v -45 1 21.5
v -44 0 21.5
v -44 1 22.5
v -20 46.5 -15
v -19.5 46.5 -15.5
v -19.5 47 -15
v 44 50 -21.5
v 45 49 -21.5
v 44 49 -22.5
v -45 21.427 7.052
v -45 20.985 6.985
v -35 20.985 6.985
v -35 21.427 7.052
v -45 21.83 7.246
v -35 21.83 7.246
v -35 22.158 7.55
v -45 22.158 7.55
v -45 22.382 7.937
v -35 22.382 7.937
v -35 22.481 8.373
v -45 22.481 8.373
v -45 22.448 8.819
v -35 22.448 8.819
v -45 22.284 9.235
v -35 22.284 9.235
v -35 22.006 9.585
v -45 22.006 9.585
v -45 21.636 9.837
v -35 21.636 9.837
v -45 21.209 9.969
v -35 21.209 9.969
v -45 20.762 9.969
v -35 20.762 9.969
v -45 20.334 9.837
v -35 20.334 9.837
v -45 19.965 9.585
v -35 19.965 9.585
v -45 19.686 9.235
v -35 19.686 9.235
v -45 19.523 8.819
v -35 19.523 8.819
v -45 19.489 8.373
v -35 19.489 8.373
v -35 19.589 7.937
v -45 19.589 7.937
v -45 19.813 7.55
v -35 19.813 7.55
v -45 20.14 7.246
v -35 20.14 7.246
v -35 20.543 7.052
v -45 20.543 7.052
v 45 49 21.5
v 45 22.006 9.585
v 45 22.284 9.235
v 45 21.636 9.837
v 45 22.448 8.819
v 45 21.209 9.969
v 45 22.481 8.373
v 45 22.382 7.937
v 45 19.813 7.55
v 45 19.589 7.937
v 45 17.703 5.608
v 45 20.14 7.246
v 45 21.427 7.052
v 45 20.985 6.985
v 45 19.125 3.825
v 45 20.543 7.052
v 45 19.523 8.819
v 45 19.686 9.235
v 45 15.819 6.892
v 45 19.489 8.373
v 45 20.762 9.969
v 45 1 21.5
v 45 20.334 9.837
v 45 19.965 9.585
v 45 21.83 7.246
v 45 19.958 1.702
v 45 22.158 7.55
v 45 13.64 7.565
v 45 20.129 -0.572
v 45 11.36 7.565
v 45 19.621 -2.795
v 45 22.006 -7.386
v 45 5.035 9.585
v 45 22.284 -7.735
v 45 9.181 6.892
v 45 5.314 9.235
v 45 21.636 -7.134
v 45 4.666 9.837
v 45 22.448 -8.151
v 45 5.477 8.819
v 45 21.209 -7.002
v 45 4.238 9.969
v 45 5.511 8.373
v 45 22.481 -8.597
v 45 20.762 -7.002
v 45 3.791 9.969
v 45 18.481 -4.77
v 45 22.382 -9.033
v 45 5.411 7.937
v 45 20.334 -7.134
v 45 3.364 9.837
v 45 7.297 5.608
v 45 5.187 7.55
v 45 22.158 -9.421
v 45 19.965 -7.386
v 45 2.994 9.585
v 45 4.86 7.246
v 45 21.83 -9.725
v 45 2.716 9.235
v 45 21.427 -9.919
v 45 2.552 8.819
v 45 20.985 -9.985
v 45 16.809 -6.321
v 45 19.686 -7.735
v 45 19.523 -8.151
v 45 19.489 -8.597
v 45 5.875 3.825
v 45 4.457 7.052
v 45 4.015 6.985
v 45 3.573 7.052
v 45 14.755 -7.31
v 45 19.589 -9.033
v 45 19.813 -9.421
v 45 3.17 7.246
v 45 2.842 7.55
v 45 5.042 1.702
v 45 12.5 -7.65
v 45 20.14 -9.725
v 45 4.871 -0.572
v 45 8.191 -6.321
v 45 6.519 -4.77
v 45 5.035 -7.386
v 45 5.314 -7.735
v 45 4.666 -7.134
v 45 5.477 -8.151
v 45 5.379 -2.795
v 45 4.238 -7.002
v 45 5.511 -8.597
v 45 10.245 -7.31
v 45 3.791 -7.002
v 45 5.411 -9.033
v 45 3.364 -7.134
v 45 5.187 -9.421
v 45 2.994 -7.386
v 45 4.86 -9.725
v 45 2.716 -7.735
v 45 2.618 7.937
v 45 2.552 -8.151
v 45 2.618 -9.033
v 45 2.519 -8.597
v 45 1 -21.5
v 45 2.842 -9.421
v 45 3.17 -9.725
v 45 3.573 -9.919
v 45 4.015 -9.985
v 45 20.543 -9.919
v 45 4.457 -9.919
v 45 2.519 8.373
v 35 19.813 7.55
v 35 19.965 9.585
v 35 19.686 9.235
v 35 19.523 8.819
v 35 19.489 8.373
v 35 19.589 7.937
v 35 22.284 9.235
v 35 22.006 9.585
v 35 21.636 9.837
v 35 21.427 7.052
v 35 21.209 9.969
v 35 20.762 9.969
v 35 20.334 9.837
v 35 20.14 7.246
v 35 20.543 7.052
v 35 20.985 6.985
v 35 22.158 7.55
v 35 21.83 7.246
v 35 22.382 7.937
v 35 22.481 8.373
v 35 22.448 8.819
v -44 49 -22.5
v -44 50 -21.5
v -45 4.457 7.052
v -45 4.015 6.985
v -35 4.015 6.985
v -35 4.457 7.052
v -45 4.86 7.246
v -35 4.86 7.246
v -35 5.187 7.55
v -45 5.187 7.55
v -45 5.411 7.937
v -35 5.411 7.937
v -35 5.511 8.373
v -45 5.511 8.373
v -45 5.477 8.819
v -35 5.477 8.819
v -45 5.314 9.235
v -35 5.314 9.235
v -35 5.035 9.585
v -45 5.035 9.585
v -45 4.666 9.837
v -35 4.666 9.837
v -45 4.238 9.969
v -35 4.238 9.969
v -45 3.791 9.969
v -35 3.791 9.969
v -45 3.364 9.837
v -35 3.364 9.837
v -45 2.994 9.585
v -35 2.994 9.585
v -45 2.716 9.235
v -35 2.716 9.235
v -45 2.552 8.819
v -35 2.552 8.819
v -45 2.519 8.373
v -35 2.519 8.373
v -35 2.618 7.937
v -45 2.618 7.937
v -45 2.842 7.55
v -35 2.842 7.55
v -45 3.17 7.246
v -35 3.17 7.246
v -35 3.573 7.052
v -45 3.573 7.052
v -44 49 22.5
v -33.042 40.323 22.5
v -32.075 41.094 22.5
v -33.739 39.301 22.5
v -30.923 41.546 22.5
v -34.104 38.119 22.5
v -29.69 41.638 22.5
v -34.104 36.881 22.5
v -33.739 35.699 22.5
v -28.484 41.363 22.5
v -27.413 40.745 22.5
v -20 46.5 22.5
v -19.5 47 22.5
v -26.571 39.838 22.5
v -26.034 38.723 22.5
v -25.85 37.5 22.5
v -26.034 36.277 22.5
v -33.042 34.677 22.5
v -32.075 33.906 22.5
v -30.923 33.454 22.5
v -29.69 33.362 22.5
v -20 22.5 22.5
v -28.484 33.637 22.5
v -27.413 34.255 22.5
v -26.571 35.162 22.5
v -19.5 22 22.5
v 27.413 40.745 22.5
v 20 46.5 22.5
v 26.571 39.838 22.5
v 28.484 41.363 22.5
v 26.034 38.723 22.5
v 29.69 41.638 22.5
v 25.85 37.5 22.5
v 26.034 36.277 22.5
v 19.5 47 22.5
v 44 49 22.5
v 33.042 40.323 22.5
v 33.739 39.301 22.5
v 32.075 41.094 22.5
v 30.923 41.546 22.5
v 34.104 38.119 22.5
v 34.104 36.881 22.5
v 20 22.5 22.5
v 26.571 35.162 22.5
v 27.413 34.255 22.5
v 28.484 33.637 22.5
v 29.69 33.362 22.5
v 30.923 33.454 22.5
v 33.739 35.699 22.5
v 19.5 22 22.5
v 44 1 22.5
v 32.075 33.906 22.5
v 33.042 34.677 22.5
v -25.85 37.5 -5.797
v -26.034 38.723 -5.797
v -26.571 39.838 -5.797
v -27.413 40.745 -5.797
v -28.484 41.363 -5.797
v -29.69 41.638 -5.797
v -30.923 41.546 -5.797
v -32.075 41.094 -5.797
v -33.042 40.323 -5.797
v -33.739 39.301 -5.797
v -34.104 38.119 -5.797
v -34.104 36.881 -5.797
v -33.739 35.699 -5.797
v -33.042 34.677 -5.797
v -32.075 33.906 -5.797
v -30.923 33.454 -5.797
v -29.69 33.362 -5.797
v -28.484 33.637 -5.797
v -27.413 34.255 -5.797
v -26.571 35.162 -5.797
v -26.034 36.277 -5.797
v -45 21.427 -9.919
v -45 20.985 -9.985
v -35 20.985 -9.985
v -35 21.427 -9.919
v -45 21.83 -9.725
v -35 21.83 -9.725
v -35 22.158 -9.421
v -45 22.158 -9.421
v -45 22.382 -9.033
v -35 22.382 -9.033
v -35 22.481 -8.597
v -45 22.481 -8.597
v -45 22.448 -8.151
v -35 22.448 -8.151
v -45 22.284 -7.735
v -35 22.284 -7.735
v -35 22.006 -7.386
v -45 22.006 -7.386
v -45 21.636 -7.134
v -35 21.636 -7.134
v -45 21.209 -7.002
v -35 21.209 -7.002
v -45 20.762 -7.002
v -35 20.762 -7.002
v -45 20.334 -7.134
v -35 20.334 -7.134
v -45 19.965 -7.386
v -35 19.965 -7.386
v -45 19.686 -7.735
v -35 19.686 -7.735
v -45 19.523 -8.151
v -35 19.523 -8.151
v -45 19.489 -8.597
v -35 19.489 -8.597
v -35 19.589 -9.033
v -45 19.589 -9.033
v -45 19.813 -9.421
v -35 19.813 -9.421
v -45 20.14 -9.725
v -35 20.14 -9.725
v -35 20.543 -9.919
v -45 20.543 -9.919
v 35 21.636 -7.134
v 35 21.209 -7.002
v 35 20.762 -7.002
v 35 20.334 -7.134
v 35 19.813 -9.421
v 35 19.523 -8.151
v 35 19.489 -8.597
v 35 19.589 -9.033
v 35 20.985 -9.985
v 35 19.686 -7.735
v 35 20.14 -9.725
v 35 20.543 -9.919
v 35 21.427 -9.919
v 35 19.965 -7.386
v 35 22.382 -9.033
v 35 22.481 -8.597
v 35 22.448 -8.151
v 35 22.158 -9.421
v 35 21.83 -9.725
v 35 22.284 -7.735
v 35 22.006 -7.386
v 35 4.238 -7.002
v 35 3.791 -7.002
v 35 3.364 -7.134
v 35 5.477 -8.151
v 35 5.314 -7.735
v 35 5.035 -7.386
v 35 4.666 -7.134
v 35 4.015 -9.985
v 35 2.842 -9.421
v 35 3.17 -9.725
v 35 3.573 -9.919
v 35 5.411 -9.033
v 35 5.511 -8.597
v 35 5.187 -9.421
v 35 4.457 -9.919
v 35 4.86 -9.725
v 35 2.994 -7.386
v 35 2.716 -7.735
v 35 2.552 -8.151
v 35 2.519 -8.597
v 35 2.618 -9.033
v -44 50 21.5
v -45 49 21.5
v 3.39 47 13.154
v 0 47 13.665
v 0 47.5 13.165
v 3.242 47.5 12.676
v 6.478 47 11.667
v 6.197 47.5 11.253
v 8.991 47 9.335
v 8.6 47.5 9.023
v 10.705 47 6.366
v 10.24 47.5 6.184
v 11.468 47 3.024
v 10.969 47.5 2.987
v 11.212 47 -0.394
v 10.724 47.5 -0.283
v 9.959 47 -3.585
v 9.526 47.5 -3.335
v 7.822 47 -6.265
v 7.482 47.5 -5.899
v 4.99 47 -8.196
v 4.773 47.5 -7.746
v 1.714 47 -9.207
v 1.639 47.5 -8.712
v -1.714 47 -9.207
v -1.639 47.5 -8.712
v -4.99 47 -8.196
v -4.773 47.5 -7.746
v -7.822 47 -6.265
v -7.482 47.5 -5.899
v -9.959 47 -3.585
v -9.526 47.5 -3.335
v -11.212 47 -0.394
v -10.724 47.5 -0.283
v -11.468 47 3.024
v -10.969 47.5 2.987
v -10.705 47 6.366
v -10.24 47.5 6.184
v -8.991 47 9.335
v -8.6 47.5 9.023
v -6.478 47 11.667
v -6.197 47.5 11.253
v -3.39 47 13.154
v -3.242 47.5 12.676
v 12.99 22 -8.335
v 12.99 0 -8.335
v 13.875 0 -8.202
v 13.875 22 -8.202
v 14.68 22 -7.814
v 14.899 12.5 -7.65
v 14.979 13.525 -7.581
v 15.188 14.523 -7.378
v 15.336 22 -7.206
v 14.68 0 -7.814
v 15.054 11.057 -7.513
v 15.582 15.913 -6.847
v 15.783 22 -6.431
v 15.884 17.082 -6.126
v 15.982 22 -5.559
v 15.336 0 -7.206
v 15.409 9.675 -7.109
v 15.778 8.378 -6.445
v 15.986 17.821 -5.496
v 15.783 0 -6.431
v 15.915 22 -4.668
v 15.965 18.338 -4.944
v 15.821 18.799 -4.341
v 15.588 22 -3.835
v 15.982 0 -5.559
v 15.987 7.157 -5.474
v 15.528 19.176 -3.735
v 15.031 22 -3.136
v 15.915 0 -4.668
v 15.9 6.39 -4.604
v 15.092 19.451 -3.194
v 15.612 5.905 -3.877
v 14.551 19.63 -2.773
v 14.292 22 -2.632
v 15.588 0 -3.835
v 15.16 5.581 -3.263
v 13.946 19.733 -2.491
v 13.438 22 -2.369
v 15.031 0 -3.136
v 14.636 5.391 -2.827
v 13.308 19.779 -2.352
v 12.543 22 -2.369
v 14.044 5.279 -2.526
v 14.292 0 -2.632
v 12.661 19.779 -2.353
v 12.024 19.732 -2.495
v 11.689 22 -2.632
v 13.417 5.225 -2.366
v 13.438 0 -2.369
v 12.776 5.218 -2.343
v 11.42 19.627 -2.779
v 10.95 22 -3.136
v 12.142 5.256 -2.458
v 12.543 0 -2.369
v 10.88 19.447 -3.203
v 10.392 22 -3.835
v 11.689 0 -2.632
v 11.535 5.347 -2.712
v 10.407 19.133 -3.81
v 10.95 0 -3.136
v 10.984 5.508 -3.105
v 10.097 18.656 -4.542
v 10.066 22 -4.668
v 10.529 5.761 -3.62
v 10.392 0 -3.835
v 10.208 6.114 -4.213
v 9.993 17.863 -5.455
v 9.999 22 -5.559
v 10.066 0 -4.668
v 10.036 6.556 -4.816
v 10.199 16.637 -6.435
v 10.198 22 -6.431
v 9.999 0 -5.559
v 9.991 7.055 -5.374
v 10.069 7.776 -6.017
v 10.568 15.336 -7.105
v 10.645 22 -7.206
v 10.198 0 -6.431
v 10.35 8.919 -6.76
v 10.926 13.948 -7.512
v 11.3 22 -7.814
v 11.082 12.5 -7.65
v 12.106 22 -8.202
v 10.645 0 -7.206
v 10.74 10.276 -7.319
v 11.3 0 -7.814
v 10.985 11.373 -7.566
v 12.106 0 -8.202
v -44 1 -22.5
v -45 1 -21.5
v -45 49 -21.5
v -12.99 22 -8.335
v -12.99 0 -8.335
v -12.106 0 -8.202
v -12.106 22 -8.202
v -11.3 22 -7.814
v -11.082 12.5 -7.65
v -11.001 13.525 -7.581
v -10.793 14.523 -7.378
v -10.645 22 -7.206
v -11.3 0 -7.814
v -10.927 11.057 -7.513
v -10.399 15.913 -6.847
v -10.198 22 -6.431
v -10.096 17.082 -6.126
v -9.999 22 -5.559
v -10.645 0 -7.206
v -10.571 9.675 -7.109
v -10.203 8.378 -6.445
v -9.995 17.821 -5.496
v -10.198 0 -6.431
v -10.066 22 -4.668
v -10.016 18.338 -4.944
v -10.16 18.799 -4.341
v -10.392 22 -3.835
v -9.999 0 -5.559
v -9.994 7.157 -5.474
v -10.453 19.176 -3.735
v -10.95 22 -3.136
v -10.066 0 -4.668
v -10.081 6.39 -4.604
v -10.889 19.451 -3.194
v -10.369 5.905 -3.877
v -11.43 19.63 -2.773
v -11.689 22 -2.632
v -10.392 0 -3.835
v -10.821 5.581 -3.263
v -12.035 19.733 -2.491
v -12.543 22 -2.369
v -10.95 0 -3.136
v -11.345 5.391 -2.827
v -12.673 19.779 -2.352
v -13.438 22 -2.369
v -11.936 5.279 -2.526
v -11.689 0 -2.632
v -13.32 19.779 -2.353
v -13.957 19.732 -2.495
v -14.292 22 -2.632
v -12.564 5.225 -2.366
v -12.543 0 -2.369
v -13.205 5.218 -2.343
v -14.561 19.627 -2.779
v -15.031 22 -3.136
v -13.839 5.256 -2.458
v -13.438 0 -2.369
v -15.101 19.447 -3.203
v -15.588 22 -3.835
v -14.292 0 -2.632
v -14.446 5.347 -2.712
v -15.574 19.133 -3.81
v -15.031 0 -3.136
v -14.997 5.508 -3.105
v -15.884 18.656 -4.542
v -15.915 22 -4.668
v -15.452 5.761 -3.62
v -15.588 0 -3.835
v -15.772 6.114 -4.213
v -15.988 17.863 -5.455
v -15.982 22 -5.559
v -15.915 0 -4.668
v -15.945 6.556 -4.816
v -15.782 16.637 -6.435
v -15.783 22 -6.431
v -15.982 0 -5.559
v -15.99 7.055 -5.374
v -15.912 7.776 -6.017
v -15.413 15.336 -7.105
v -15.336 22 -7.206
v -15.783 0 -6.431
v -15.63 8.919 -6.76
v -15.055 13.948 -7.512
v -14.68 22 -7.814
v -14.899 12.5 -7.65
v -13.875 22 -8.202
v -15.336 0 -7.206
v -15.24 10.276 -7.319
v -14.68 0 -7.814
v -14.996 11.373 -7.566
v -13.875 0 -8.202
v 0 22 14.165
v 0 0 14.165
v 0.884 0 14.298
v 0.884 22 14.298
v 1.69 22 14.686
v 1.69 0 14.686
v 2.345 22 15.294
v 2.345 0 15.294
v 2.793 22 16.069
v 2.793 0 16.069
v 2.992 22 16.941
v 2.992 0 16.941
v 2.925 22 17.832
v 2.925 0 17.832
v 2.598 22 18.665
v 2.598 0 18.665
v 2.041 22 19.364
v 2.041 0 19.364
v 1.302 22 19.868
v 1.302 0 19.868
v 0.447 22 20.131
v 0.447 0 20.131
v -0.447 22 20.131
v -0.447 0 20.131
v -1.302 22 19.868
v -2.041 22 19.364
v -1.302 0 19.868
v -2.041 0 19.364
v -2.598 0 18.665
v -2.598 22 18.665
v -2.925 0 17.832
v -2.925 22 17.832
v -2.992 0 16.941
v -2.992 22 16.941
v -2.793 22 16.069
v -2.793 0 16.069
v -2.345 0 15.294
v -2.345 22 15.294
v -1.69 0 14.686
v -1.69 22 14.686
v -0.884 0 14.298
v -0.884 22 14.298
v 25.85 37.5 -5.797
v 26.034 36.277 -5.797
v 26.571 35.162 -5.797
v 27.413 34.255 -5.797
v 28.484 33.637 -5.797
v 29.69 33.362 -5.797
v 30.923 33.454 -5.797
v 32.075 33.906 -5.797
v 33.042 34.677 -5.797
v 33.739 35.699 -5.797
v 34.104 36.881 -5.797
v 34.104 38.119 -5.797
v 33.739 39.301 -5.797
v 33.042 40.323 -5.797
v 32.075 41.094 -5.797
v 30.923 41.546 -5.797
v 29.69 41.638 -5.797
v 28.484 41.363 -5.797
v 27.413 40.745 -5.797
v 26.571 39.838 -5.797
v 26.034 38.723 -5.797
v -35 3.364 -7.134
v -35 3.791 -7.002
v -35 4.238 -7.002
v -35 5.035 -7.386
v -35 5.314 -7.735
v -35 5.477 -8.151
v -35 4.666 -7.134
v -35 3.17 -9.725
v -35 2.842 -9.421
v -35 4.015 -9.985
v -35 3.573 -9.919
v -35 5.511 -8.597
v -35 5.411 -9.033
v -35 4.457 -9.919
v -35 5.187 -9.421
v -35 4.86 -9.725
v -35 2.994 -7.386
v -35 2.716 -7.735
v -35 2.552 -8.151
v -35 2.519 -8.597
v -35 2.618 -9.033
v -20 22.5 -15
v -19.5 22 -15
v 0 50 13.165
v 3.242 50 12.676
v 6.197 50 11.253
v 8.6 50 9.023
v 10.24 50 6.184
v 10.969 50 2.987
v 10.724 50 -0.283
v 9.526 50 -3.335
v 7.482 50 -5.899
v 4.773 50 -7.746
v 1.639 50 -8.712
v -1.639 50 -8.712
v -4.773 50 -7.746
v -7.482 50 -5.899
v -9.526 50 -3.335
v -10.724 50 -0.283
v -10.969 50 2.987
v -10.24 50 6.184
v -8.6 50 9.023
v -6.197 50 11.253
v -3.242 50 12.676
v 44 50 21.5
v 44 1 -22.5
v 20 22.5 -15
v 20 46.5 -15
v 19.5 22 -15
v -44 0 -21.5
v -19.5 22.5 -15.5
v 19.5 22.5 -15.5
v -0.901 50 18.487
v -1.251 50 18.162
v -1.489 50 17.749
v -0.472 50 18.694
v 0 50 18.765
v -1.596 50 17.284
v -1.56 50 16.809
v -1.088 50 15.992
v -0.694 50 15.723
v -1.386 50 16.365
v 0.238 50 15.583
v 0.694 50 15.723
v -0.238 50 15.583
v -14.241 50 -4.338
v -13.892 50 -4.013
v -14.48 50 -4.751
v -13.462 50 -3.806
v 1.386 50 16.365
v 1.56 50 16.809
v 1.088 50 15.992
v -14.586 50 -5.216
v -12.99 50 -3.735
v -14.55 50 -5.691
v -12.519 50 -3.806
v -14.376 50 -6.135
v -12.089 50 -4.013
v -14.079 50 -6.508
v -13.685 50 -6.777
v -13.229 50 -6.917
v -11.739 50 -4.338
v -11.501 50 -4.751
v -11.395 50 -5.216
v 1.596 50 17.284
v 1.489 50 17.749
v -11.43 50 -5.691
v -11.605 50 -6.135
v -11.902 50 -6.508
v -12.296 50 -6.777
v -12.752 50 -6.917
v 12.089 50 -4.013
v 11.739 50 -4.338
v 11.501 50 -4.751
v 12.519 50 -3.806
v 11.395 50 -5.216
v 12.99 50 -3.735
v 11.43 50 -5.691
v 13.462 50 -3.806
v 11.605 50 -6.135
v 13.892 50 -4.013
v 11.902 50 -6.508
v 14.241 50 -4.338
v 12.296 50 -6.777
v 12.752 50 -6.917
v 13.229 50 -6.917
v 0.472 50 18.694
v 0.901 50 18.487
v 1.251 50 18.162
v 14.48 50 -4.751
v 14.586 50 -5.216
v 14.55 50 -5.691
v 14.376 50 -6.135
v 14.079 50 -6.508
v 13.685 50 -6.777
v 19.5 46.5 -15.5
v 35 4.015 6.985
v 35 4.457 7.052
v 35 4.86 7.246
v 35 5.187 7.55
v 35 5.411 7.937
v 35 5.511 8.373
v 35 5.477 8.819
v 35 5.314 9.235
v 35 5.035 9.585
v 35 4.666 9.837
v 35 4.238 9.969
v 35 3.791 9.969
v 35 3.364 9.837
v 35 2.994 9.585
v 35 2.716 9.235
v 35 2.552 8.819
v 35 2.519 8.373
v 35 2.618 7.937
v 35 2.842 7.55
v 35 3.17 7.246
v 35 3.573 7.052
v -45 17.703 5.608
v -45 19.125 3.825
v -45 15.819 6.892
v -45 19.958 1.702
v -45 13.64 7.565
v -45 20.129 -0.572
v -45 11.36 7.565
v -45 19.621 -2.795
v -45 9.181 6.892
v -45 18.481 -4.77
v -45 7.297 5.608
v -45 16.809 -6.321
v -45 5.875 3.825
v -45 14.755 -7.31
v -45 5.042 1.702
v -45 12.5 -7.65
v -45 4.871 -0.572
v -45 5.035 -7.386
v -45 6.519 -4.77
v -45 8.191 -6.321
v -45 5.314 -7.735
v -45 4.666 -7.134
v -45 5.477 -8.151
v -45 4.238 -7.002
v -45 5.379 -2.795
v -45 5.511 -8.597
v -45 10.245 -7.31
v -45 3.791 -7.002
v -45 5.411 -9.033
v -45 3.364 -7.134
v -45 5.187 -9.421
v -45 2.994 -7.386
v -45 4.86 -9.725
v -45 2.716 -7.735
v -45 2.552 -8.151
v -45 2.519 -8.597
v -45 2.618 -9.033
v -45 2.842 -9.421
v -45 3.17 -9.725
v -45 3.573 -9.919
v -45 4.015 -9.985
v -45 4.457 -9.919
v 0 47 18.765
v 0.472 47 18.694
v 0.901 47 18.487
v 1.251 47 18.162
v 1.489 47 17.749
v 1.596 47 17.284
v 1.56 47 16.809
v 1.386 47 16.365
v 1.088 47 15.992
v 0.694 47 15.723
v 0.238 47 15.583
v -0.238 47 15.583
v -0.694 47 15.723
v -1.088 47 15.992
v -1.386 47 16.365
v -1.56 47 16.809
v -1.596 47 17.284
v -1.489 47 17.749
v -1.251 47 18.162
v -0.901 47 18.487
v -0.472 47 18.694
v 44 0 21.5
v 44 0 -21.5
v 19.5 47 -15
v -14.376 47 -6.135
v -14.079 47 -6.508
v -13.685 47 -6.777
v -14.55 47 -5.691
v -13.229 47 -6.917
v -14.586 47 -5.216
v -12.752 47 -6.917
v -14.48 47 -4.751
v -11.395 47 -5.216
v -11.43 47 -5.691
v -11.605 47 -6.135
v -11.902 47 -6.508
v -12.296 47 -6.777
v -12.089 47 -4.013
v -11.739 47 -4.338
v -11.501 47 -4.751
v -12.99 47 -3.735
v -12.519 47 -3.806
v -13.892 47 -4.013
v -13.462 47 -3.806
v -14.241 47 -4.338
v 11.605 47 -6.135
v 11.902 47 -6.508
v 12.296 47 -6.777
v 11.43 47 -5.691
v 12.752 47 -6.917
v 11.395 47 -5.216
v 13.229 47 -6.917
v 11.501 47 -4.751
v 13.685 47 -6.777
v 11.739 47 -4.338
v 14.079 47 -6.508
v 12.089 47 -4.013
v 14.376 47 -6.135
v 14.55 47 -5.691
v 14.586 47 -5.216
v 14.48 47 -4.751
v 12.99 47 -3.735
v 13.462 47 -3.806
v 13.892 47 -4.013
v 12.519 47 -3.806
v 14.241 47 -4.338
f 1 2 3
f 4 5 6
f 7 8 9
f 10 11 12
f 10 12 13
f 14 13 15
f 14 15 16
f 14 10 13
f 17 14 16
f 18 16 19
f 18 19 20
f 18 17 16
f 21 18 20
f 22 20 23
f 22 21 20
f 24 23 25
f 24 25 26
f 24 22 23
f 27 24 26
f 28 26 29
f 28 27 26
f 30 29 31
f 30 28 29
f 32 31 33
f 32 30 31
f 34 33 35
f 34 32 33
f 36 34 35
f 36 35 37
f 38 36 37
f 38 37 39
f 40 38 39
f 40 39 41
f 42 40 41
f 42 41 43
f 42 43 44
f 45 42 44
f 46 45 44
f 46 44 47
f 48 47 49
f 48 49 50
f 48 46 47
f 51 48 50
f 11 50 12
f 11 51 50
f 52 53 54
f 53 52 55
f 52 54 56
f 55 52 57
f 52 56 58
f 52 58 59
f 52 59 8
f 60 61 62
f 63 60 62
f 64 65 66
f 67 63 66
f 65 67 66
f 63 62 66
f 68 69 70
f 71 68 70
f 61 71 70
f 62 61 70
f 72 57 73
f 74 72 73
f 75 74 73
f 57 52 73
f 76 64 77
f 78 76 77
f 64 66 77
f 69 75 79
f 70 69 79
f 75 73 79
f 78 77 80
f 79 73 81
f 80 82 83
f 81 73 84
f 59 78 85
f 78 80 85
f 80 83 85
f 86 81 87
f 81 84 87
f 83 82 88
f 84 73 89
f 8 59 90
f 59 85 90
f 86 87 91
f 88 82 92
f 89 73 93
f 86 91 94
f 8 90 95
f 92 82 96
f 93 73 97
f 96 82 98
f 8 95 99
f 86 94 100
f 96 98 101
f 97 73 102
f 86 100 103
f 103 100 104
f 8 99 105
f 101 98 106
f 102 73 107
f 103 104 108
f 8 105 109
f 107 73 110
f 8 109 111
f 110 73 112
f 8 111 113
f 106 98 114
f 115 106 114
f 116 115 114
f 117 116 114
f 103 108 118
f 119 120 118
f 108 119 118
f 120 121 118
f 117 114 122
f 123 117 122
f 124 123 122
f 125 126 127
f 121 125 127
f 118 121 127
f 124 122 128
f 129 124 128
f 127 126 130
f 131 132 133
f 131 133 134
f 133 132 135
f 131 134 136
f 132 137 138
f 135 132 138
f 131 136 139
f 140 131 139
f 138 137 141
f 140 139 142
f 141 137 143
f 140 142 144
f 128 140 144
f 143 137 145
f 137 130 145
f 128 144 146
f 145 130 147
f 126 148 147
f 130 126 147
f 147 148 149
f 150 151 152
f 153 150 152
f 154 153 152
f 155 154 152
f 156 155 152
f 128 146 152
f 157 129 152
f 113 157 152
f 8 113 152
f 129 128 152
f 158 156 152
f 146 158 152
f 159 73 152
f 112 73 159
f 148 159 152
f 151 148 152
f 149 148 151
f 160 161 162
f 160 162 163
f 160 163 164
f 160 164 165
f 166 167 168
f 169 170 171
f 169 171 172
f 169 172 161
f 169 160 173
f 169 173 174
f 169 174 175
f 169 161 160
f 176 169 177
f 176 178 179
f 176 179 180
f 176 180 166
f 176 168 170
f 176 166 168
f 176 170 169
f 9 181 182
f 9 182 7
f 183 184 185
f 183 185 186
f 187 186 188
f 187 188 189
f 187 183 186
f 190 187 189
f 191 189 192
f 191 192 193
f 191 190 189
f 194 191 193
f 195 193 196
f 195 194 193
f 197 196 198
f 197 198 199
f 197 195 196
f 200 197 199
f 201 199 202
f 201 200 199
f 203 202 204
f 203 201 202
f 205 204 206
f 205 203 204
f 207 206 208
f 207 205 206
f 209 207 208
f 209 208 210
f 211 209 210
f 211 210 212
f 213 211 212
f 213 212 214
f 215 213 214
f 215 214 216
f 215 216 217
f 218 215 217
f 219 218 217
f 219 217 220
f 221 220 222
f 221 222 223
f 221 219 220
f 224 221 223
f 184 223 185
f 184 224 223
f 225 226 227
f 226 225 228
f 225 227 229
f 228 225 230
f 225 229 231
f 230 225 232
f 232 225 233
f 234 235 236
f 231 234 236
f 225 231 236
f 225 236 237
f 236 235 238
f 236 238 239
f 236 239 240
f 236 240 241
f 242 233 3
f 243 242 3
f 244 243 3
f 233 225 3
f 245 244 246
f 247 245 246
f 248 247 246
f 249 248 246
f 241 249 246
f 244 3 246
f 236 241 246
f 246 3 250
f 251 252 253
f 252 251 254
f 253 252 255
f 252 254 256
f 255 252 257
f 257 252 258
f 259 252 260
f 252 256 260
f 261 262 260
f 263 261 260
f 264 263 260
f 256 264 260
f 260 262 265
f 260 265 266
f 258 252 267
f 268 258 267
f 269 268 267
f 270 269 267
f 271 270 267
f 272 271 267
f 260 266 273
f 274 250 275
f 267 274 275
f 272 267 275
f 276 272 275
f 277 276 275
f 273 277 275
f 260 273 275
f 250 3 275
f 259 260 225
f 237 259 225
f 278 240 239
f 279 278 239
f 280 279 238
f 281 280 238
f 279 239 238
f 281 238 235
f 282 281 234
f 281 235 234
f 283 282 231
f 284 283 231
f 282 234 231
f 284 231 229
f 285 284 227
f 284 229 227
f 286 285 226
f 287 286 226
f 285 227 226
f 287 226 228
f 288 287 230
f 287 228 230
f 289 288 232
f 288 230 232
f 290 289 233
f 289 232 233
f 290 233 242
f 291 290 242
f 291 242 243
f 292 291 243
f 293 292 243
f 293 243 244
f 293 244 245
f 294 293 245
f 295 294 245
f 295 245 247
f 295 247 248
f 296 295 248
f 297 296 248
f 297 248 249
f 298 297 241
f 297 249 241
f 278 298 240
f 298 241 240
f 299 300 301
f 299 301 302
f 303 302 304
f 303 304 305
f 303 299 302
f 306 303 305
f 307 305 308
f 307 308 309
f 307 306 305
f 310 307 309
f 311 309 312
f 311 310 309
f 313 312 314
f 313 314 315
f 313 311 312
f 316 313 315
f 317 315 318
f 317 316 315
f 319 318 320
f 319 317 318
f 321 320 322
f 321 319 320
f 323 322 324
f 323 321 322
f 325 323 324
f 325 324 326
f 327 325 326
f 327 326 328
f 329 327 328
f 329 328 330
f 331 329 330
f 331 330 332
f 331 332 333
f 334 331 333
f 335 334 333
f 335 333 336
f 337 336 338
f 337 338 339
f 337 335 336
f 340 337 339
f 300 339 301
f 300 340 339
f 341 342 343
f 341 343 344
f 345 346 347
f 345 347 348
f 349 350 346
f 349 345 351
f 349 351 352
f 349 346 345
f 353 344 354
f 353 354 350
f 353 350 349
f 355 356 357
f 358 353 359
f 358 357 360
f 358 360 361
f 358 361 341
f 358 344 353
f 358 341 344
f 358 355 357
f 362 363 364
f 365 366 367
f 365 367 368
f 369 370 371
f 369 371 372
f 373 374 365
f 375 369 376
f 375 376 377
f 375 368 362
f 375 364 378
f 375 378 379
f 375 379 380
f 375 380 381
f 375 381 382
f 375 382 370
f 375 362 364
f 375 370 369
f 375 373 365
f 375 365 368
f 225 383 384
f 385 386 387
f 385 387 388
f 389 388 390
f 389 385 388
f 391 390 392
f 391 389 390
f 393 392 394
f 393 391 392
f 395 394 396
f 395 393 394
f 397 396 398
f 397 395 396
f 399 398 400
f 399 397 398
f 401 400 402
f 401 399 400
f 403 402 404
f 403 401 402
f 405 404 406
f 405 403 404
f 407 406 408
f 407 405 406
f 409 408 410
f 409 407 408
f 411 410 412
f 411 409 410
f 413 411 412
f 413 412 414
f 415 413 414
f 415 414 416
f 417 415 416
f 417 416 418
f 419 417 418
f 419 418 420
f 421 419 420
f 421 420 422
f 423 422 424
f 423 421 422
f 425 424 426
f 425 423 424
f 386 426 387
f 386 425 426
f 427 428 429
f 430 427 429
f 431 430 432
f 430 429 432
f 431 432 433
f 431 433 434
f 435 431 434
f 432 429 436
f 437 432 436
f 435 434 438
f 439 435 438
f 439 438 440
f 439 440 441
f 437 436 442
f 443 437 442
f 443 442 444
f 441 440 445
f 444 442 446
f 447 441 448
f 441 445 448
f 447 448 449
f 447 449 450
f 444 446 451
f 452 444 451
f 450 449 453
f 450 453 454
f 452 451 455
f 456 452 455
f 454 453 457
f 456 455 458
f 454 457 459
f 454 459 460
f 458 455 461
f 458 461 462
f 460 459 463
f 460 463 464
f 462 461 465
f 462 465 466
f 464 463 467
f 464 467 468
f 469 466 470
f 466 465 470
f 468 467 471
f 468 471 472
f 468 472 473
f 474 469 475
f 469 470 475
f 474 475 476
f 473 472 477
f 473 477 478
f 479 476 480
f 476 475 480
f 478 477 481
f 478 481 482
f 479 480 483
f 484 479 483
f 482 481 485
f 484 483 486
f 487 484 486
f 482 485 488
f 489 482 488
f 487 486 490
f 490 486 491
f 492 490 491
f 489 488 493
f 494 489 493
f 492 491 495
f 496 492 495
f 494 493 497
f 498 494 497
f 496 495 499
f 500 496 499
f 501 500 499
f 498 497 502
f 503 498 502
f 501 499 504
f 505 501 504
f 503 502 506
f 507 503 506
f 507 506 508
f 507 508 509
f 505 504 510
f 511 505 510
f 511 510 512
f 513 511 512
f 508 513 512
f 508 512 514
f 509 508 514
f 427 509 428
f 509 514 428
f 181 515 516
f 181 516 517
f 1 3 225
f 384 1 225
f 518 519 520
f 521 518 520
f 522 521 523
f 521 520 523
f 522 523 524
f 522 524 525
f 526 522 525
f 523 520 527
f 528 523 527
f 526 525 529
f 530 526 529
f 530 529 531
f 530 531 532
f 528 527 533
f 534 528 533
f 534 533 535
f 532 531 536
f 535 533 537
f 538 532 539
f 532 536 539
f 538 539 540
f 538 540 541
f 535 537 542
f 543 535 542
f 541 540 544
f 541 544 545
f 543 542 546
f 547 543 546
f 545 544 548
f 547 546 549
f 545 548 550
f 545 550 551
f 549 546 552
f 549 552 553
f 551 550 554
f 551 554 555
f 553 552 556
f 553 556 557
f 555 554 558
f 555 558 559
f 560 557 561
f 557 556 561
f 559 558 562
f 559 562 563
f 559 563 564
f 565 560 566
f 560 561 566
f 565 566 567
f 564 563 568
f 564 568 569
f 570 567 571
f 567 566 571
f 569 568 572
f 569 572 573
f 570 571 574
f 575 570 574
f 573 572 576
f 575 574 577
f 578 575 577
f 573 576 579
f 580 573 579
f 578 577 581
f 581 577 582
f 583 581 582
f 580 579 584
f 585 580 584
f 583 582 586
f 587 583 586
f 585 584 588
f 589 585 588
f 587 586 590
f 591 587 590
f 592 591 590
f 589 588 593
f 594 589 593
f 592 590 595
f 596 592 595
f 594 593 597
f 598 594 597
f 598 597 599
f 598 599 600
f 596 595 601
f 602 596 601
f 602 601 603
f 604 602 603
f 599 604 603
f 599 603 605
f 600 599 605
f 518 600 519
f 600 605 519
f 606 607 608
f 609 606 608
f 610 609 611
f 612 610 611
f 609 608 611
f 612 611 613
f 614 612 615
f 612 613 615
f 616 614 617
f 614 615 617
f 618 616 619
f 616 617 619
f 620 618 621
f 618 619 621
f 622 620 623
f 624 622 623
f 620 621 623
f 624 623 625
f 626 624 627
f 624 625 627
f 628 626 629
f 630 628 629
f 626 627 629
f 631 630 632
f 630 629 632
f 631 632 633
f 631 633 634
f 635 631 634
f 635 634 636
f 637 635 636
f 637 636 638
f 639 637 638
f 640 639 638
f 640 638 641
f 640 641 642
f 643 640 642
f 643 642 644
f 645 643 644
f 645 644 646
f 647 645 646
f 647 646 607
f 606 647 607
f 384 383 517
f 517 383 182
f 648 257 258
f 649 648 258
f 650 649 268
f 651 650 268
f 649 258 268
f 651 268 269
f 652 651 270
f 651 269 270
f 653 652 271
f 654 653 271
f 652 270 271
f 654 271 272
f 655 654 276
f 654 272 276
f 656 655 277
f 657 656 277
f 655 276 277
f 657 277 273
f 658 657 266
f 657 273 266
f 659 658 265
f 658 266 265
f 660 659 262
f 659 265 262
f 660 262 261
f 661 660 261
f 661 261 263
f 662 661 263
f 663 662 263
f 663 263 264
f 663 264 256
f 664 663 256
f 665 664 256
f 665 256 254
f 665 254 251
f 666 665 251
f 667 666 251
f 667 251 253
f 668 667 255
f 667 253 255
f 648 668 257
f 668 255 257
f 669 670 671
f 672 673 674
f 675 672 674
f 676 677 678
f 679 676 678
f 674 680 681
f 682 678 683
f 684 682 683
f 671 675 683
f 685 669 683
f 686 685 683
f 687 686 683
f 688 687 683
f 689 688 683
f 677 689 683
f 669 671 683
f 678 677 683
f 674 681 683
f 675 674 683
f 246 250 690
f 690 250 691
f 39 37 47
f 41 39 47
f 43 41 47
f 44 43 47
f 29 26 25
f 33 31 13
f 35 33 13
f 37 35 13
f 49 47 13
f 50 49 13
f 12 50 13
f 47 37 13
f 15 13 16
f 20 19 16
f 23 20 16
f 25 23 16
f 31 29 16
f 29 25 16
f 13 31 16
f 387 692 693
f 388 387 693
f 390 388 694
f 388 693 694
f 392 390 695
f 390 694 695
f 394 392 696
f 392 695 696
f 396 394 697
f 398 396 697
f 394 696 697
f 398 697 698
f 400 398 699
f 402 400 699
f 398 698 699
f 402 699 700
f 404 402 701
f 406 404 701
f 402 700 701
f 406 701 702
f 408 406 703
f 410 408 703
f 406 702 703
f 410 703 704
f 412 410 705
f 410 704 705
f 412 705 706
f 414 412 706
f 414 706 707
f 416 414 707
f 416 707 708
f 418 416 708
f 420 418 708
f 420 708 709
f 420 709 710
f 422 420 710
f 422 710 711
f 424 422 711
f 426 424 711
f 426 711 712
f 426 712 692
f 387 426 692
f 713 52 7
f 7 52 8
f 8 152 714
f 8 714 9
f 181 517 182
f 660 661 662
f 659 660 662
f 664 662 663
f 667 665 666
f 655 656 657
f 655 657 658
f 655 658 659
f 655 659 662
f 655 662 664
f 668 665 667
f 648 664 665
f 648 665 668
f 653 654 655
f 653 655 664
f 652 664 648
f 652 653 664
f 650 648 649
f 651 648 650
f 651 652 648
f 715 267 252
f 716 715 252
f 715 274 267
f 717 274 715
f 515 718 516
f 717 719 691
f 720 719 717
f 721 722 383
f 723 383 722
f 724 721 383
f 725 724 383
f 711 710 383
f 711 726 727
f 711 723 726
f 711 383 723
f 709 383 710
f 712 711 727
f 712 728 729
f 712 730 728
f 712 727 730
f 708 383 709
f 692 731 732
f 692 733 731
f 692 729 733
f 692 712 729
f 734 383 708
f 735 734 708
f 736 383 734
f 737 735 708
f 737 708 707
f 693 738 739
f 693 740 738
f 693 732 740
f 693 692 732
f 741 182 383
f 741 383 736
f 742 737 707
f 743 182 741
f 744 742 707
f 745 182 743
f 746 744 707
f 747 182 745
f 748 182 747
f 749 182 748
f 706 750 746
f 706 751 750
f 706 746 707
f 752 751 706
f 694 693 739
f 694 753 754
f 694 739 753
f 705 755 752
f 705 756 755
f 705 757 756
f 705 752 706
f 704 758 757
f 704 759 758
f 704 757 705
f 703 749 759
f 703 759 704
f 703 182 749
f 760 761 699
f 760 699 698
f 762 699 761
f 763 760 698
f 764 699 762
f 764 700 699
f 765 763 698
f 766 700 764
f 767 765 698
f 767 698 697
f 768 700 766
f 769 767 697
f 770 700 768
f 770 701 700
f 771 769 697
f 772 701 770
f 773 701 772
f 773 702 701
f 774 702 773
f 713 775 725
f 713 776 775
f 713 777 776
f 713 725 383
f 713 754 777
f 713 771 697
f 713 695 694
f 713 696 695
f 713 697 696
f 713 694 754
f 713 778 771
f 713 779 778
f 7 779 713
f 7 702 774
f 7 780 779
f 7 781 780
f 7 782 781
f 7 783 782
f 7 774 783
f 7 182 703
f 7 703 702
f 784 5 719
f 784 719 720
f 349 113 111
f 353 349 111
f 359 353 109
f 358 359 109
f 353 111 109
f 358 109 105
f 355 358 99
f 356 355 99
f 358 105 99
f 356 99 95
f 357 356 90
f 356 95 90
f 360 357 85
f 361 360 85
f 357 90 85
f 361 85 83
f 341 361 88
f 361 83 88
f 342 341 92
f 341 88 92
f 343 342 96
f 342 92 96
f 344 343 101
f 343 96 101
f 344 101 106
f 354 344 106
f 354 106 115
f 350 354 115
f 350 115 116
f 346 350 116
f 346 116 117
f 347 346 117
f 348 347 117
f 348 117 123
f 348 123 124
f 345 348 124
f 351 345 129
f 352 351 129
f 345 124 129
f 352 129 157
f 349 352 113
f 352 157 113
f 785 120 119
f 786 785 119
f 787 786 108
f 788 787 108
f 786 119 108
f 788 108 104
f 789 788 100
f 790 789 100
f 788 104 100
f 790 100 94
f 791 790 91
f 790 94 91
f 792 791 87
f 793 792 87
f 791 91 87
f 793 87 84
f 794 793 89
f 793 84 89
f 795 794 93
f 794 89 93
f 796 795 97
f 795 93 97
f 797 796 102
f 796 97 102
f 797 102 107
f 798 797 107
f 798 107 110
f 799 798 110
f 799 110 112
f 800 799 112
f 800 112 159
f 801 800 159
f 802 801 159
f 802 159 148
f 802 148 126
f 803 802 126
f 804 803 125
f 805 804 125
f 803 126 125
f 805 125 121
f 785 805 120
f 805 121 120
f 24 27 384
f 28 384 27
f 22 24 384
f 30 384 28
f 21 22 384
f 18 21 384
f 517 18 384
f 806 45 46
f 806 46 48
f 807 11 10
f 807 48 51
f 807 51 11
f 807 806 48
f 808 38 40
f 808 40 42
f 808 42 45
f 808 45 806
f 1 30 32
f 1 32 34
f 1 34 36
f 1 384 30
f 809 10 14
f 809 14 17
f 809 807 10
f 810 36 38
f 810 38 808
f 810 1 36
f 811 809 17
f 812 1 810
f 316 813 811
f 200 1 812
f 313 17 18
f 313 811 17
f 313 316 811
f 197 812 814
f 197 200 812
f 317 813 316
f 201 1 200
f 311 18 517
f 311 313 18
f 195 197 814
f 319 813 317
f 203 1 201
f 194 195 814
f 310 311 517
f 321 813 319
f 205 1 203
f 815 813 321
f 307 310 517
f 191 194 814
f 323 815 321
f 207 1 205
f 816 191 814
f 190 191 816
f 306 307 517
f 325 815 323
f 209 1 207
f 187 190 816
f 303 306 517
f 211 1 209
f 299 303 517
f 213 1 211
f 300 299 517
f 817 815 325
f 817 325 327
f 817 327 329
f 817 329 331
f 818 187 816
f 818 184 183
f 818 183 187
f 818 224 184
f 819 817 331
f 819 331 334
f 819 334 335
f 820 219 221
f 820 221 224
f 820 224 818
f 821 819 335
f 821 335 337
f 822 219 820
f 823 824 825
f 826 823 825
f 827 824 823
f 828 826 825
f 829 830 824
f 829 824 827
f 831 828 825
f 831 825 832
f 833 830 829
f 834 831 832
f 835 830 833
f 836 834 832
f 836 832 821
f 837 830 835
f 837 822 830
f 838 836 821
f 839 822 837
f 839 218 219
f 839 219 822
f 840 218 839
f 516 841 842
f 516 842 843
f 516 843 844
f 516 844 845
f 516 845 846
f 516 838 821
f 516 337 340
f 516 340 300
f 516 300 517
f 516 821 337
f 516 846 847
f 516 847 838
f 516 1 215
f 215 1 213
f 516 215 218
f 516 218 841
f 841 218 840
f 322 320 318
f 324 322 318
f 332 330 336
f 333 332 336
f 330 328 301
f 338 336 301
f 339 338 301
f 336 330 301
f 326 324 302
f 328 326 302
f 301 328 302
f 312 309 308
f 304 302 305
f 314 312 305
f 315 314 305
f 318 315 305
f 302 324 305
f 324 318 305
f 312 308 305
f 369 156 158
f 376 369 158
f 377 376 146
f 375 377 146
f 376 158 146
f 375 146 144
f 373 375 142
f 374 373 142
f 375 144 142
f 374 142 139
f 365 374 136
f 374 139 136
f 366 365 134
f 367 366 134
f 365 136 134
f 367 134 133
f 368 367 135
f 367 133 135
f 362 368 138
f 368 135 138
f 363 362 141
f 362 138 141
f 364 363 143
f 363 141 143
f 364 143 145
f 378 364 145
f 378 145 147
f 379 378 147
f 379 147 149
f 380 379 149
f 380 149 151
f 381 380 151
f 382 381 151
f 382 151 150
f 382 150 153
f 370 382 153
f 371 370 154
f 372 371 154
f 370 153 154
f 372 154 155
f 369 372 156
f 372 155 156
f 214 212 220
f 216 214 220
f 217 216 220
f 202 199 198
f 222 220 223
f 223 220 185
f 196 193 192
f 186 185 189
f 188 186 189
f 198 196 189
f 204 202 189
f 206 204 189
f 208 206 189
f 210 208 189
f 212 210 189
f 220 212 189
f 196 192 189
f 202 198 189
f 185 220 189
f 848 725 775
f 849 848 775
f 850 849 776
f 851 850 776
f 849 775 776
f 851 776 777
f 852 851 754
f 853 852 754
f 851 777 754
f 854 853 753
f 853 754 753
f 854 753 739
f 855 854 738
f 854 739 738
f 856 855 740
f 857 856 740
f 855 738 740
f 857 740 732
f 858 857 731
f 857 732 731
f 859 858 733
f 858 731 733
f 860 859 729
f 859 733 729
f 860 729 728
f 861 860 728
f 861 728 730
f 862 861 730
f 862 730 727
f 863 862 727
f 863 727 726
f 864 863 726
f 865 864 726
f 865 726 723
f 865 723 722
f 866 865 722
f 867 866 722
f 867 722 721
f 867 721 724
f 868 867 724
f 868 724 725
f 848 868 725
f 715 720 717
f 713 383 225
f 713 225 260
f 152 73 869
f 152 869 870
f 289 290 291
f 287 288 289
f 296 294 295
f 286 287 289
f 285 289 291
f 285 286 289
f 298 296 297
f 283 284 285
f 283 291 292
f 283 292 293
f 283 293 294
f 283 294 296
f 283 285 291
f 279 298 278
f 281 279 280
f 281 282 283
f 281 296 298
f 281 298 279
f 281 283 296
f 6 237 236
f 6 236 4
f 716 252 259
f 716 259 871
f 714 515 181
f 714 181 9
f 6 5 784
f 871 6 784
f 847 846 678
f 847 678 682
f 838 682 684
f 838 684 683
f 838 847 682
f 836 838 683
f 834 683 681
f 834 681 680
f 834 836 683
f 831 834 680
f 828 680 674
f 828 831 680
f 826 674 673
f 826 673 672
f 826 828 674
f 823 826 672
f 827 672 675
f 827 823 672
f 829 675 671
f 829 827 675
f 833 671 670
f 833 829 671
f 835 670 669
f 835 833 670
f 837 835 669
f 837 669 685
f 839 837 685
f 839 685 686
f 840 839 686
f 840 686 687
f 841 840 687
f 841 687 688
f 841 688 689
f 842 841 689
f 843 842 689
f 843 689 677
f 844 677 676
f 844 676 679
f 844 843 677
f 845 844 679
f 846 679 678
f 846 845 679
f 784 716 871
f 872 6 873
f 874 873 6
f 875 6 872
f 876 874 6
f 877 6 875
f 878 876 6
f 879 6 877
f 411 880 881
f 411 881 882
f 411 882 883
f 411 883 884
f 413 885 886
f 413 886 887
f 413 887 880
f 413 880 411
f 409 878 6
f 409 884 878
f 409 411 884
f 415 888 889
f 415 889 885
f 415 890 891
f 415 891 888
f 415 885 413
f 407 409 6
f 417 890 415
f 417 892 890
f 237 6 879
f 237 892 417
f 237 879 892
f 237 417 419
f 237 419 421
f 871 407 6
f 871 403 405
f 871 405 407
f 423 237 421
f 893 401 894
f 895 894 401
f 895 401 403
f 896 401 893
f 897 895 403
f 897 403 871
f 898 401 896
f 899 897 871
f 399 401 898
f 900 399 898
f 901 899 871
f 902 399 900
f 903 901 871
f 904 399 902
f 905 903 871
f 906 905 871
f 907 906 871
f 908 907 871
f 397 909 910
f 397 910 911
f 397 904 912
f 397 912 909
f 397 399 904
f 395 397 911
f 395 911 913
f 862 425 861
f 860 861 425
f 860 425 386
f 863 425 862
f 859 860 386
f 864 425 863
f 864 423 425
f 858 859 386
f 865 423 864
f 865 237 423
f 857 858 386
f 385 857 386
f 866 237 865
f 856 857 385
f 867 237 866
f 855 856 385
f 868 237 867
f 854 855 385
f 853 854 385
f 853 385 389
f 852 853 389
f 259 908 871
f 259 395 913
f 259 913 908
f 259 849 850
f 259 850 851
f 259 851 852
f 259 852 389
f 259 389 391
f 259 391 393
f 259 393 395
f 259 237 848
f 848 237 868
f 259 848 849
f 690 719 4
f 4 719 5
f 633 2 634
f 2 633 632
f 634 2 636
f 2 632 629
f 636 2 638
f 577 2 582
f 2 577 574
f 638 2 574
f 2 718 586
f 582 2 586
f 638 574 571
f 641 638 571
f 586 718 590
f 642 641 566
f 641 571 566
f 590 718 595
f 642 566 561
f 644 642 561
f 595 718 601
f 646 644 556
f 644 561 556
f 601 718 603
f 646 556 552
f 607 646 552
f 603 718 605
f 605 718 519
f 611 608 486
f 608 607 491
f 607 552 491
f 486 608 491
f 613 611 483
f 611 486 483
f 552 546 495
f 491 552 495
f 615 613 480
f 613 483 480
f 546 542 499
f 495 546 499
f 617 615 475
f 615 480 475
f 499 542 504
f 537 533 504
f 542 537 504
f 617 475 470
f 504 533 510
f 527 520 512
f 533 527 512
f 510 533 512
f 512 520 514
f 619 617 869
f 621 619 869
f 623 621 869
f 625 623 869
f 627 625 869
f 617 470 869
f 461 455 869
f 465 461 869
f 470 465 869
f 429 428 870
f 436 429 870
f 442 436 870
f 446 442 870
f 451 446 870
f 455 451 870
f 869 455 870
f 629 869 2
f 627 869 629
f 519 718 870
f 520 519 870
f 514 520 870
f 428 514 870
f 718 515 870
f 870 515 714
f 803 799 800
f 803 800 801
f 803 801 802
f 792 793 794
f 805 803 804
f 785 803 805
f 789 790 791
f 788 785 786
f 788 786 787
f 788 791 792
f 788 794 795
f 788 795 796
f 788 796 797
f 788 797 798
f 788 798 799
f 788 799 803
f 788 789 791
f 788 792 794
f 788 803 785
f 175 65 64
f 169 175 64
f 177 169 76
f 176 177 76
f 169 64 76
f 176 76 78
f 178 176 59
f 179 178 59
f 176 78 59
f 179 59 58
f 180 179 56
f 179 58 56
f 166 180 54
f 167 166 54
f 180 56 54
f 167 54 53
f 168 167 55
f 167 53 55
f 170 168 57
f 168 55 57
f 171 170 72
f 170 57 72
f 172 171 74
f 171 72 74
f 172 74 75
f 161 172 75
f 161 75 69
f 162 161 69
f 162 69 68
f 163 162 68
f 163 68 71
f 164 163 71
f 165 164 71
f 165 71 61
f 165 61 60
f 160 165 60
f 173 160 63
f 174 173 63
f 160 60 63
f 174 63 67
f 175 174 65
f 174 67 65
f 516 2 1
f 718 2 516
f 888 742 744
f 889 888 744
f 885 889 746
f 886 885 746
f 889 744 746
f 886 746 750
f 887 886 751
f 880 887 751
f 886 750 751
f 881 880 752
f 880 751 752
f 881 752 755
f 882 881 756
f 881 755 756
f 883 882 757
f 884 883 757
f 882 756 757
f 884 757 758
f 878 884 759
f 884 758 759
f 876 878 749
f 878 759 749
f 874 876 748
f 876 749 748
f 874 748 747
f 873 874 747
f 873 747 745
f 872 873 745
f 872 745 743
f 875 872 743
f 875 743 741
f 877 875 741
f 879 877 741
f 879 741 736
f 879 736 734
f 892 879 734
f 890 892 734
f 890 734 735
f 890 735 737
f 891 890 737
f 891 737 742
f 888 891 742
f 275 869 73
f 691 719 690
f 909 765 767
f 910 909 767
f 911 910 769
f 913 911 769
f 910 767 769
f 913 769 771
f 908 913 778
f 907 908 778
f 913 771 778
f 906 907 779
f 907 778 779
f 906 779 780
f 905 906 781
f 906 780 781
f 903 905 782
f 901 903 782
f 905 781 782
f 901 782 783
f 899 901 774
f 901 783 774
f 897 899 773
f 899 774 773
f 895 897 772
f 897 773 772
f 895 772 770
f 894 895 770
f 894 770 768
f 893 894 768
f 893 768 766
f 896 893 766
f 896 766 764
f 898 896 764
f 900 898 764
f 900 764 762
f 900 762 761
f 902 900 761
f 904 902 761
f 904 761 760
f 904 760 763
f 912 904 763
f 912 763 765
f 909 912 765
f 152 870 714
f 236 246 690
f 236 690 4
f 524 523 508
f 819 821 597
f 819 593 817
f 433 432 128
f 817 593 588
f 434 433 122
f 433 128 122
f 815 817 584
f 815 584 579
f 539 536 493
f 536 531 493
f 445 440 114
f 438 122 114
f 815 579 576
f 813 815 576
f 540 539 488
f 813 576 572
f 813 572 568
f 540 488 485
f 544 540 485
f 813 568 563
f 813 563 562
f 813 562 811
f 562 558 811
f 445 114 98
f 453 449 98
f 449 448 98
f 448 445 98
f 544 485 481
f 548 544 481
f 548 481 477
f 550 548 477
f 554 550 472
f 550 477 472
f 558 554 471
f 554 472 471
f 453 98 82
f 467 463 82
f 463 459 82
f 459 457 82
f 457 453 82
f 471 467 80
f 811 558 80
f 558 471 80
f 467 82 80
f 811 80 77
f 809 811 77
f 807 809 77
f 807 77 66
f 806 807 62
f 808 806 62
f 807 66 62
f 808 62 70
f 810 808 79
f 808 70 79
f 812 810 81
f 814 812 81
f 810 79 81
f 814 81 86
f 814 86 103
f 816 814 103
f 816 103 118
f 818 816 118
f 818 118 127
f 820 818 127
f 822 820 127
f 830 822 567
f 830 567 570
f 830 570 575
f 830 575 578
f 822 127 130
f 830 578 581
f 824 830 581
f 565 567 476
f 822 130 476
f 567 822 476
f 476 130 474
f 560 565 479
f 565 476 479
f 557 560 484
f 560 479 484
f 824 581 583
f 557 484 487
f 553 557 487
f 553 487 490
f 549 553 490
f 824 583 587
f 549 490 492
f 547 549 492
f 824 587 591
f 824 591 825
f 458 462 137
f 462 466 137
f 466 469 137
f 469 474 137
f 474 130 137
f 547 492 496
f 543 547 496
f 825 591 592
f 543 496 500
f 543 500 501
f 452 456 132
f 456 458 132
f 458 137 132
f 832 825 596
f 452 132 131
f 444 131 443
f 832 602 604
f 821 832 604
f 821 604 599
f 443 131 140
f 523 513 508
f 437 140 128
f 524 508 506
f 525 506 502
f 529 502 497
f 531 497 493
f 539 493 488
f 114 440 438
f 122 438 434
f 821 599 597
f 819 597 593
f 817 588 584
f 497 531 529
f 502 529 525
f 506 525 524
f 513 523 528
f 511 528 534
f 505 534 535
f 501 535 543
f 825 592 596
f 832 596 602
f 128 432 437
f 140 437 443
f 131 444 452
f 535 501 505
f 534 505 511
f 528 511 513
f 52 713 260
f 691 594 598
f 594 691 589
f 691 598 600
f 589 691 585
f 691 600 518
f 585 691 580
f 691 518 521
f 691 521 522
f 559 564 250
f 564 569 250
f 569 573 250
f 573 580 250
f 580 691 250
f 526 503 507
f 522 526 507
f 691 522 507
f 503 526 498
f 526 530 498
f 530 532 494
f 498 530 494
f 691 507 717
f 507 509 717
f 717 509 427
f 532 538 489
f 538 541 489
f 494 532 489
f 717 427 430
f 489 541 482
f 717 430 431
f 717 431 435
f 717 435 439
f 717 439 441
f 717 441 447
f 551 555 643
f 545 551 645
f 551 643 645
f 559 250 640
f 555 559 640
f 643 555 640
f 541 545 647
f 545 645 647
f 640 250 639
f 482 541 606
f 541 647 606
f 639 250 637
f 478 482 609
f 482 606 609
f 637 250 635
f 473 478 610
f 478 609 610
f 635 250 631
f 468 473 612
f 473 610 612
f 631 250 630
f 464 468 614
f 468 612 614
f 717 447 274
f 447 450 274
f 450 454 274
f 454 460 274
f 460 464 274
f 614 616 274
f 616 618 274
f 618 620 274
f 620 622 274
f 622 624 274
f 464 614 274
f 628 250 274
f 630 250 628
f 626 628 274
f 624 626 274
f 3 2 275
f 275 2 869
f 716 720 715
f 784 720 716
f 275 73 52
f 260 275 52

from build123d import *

# Parameters (mm, degrees)
SKETCH1_W           = 90
SKETCH1_H           = 45
BOSS_EXTRUDE1_DEPTH = 50
SKETCH2_R           = 4.15
CUT_EXTRUDE1_DEPTH  = 28.296664924
SKETCH3_R           = 7.65
CUT_EXTRUDE2_DEPTH  = 106.386194542
SKETCH4_R           = 1.5
CUT_EXTRUDE3_DEPTH  = 10
CHAMFER1_SIZE       = 1
SKETCH6_W           = 40
SKETCH6_H           = 25
CUT_EXTRUDE5_DEPTH  = 38
CUT_EXTRUDE4_REACH  = 72.931
SKETCH5_R           = 1.6
SKETCH5_R_2         = 11
CUT_EXTRUDE6_REACH  = 72.931
SKETCH8_R           = 3
CHAMFER2_SIZE       = 0.5


with BuildPart() as part:
    # Sketch1 → Boss-Extrude1 (new body)
    with BuildSketch(Plane(origin=(0, 0, 0), x_dir=(1, 0, 0), z_dir=(0, 1, 0))):
        Rectangle(SKETCH1_W, SKETCH1_H)
    extrude(amount=BOSS_EXTRUDE1_DEPTH)

    # Sketch2 → Cut-Extrude1 (cut)
    with BuildSketch(Plane.XY.offset(22.5)):
        with Locations((-30, 37.5)):
            Circle(SKETCH2_R)
        with Locations(Location((30, 37.5, 0), (0, 0, 180))):
            Circle(SKETCH2_R)
    extrude(amount=-CUT_EXTRUDE1_DEPTH, mode=Mode.SUBTRACT)

    # Sketch3 → Cut-Extrude2 (cut, through all)
    with BuildSketch(Plane(origin=(45, 0, 0), x_dir=(0, 0, -1), z_dir=(1, 0, 0))):
        with Locations((0, 12.5)):
            Circle(SKETCH3_R)
    extrude(amount=-CUT_EXTRUDE2_DEPTH, mode=Mode.SUBTRACT)

    # Sketch4 → Cut-Extrude3 (cut)
    with BuildSketch(Plane(origin=(45, 0, 0), x_dir=(0, 0, -1), z_dir=(1, 0, 0))):
        with Locations((-8.485281374, 20.985281374)):
            Circle(SKETCH4_R)
        with Locations((8.485281374, 20.985281374)):
            Circle(SKETCH4_R)
        with Locations((8.485281374, 4.014718626)):
            Circle(SKETCH4_R)
        with Locations((-8.485281374, 4.014718626)):
            Circle(SKETCH4_R)
    cut_extrude3 = extrude(amount=-CUT_EXTRUDE3_DEPTH, mode=Mode.SUBTRACT)

    # Mirror1: Cut-Extrude3 across plane
    add(cut_extrude3.mirror(Plane(origin=(0, 0, 0), x_dir=(0, 0, 1), z_dir=(1, 0, 0))), mode=Mode.SUBTRACT)

    # Chamfer1
    chamfer1_edges = [part.edges().sort_by_distance(p)[0] for p in [
        (-45, 50, 0),
        (0, 50, 22.5),
        (45, 50, 0),
        (0, 0, 22.5),
        (-45, 0, 0),
        (0, 0, -22.5),
        (45, 0, 0),
        (45, 25, 22.5),
        (-45, 25, 22.5),
        (-45, 25, -22.5),
        (45, 25, -22.5),
        (0, 50, -22.5),
    ]]
    chamfer(chamfer1_edges, length=CHAMFER1_SIZE)

    # Sketch6 → Cut-Extrude5 (cut)
    with BuildSketch(Plane.XY.offset(22.5)):
        with Locations((0, 34.5)):
            Rectangle(SKETCH6_W, SKETCH6_H)
    extrude(amount=-CUT_EXTRUDE5_DEPTH, mode=Mode.SUBTRACT)

    # Sketch5 → Cut-Extrude4 (cut, up to next)
    with BuildSketch(Plane(origin=(0, 50, 0), x_dir=(1, 0, 0), z_dir=(0, 1, 0)), mode=Mode.PRIVATE) as cut_extrude4_sk1:
        with Locations(Location((0, -17.164837936, 0), (0, 0, 270))):
            Circle(SKETCH5_R)
    cut_extrude4_tool1 = extrude(cut_extrude4_sk1.sketch, amount=-CUT_EXTRUDE4_REACH, mode=Mode.PRIVATE) & part.part
    # Sketch5 → Cut-Extrude4 (cut, up to next)
    with BuildSketch(Plane(origin=(0, 50, 0), x_dir=(1, 0, 0), z_dir=(0, 1, 0)), mode=Mode.PRIVATE) as cut_extrude4_sk2:
        with Locations(Location((-12.990381057, 5.335162064, 0), (0, 0, 270))):
            Circle(SKETCH5_R)
    cut_extrude4_tool2 = extrude(cut_extrude4_sk2.sketch, amount=-CUT_EXTRUDE4_REACH, mode=Mode.PRIVATE) & part.part
    # Sketch5 → Cut-Extrude4 (cut, up to next)
    with BuildSketch(Plane(origin=(0, 50, 0), x_dir=(1, 0, 0), z_dir=(0, 1, 0)), mode=Mode.PRIVATE) as cut_extrude4_sk3:
        with Locations(Location((12.990381057, 5.335162064, 0), (0, 0, 270))):
            Circle(SKETCH5_R)
    cut_extrude4_tool3 = extrude(cut_extrude4_sk3.sketch, amount=-CUT_EXTRUDE4_REACH, mode=Mode.PRIVATE) & part.part
    # Sketch5 → Cut-Extrude4 (cut, up to next)
    with BuildSketch(Plane(origin=(0, 50, 0), x_dir=(1, 0, 0), z_dir=(0, 1, 0)), mode=Mode.PRIVATE) as cut_extrude4_sk4:
        with Locations(Location((0, -2.164837936, 0), (0, 0, 270))):
            Circle(SKETCH5_R_2)
    cut_extrude4_tool4 = extrude(cut_extrude4_sk4.sketch, amount=-CUT_EXTRUDE4_REACH, mode=Mode.PRIVATE) & part.part
    add(cut_extrude4_tool1.solids().sort_by_distance((0, 50, 17.164838))[0], mode=Mode.SUBTRACT)
    add(cut_extrude4_tool2.solids().sort_by_distance((-12.990381, 50, -5.335162))[0], mode=Mode.SUBTRACT)
    add(cut_extrude4_tool3.solids().sort_by_distance((12.990381, 50, -5.335162))[0], mode=Mode.SUBTRACT)
    add(cut_extrude4_tool4.solids().sort_by_distance((0, 50, 2.164838))[0], mode=Mode.SUBTRACT)

    # Sketch8 → Cut-Extrude6 (cut, up to next)
    with BuildSketch(Plane.XZ, mode=Mode.PRIVATE) as cut_extrude6_sk1:
        with Locations(Location((0, 17.164837936, 0), (0, 0, 270))):
            Circle(SKETCH8_R)
    cut_extrude6_tool1 = extrude(cut_extrude6_sk1.sketch, amount=-CUT_EXTRUDE6_REACH, mode=Mode.PRIVATE) & part.part
    # Sketch8 → Cut-Extrude6 (cut, up to next)
    with BuildSketch(Plane.XZ, mode=Mode.PRIVATE) as cut_extrude6_sk2:
        with Locations(Location((12.990381057, -5.335162064, 0), (0, 0, 270))):
            Circle(SKETCH8_R)
    cut_extrude6_tool2 = extrude(cut_extrude6_sk2.sketch, amount=-CUT_EXTRUDE6_REACH, mode=Mode.PRIVATE) & part.part
    # Sketch8 → Cut-Extrude6 (cut, up to next)
    with BuildSketch(Plane.XZ, mode=Mode.PRIVATE) as cut_extrude6_sk3:
        with Locations(Location((-12.990381057, -5.335162064, 0), (0, 0, 270))):
            Circle(SKETCH8_R)
    cut_extrude6_tool3 = extrude(cut_extrude6_sk3.sketch, amount=-CUT_EXTRUDE6_REACH, mode=Mode.PRIVATE) & part.part
    add(cut_extrude6_tool1.solids().sort_by_distance((0, 0, 17.164838))[0], mode=Mode.SUBTRACT)
    add(cut_extrude6_tool2.solids().sort_by_distance((12.990381, 0, -5.335162))[0], mode=Mode.SUBTRACT)
    add(cut_extrude6_tool3.solids().sort_by_distance((-12.990381, 0, -5.335162))[0], mode=Mode.SUBTRACT)

    # Chamfer2
    chamfer2_edges = [part.edges().sort_by_distance(p)[0] for p in [
        (20, 34.5, -15.5),
        (20, 47, 3.5),
        (0, 22, -15.5),
        (20, 22, 3.5),
        (-20, 34.5, -15.5),
        (-20, 22, 3.5),
        (0, 47, -15.5),
        (-20, 47, 3.5),
        (0, 47, -8.835162064),
    ]]
    chamfer(chamfer2_edges, length=CHAMFER2_SIZE)


solid = part.part
